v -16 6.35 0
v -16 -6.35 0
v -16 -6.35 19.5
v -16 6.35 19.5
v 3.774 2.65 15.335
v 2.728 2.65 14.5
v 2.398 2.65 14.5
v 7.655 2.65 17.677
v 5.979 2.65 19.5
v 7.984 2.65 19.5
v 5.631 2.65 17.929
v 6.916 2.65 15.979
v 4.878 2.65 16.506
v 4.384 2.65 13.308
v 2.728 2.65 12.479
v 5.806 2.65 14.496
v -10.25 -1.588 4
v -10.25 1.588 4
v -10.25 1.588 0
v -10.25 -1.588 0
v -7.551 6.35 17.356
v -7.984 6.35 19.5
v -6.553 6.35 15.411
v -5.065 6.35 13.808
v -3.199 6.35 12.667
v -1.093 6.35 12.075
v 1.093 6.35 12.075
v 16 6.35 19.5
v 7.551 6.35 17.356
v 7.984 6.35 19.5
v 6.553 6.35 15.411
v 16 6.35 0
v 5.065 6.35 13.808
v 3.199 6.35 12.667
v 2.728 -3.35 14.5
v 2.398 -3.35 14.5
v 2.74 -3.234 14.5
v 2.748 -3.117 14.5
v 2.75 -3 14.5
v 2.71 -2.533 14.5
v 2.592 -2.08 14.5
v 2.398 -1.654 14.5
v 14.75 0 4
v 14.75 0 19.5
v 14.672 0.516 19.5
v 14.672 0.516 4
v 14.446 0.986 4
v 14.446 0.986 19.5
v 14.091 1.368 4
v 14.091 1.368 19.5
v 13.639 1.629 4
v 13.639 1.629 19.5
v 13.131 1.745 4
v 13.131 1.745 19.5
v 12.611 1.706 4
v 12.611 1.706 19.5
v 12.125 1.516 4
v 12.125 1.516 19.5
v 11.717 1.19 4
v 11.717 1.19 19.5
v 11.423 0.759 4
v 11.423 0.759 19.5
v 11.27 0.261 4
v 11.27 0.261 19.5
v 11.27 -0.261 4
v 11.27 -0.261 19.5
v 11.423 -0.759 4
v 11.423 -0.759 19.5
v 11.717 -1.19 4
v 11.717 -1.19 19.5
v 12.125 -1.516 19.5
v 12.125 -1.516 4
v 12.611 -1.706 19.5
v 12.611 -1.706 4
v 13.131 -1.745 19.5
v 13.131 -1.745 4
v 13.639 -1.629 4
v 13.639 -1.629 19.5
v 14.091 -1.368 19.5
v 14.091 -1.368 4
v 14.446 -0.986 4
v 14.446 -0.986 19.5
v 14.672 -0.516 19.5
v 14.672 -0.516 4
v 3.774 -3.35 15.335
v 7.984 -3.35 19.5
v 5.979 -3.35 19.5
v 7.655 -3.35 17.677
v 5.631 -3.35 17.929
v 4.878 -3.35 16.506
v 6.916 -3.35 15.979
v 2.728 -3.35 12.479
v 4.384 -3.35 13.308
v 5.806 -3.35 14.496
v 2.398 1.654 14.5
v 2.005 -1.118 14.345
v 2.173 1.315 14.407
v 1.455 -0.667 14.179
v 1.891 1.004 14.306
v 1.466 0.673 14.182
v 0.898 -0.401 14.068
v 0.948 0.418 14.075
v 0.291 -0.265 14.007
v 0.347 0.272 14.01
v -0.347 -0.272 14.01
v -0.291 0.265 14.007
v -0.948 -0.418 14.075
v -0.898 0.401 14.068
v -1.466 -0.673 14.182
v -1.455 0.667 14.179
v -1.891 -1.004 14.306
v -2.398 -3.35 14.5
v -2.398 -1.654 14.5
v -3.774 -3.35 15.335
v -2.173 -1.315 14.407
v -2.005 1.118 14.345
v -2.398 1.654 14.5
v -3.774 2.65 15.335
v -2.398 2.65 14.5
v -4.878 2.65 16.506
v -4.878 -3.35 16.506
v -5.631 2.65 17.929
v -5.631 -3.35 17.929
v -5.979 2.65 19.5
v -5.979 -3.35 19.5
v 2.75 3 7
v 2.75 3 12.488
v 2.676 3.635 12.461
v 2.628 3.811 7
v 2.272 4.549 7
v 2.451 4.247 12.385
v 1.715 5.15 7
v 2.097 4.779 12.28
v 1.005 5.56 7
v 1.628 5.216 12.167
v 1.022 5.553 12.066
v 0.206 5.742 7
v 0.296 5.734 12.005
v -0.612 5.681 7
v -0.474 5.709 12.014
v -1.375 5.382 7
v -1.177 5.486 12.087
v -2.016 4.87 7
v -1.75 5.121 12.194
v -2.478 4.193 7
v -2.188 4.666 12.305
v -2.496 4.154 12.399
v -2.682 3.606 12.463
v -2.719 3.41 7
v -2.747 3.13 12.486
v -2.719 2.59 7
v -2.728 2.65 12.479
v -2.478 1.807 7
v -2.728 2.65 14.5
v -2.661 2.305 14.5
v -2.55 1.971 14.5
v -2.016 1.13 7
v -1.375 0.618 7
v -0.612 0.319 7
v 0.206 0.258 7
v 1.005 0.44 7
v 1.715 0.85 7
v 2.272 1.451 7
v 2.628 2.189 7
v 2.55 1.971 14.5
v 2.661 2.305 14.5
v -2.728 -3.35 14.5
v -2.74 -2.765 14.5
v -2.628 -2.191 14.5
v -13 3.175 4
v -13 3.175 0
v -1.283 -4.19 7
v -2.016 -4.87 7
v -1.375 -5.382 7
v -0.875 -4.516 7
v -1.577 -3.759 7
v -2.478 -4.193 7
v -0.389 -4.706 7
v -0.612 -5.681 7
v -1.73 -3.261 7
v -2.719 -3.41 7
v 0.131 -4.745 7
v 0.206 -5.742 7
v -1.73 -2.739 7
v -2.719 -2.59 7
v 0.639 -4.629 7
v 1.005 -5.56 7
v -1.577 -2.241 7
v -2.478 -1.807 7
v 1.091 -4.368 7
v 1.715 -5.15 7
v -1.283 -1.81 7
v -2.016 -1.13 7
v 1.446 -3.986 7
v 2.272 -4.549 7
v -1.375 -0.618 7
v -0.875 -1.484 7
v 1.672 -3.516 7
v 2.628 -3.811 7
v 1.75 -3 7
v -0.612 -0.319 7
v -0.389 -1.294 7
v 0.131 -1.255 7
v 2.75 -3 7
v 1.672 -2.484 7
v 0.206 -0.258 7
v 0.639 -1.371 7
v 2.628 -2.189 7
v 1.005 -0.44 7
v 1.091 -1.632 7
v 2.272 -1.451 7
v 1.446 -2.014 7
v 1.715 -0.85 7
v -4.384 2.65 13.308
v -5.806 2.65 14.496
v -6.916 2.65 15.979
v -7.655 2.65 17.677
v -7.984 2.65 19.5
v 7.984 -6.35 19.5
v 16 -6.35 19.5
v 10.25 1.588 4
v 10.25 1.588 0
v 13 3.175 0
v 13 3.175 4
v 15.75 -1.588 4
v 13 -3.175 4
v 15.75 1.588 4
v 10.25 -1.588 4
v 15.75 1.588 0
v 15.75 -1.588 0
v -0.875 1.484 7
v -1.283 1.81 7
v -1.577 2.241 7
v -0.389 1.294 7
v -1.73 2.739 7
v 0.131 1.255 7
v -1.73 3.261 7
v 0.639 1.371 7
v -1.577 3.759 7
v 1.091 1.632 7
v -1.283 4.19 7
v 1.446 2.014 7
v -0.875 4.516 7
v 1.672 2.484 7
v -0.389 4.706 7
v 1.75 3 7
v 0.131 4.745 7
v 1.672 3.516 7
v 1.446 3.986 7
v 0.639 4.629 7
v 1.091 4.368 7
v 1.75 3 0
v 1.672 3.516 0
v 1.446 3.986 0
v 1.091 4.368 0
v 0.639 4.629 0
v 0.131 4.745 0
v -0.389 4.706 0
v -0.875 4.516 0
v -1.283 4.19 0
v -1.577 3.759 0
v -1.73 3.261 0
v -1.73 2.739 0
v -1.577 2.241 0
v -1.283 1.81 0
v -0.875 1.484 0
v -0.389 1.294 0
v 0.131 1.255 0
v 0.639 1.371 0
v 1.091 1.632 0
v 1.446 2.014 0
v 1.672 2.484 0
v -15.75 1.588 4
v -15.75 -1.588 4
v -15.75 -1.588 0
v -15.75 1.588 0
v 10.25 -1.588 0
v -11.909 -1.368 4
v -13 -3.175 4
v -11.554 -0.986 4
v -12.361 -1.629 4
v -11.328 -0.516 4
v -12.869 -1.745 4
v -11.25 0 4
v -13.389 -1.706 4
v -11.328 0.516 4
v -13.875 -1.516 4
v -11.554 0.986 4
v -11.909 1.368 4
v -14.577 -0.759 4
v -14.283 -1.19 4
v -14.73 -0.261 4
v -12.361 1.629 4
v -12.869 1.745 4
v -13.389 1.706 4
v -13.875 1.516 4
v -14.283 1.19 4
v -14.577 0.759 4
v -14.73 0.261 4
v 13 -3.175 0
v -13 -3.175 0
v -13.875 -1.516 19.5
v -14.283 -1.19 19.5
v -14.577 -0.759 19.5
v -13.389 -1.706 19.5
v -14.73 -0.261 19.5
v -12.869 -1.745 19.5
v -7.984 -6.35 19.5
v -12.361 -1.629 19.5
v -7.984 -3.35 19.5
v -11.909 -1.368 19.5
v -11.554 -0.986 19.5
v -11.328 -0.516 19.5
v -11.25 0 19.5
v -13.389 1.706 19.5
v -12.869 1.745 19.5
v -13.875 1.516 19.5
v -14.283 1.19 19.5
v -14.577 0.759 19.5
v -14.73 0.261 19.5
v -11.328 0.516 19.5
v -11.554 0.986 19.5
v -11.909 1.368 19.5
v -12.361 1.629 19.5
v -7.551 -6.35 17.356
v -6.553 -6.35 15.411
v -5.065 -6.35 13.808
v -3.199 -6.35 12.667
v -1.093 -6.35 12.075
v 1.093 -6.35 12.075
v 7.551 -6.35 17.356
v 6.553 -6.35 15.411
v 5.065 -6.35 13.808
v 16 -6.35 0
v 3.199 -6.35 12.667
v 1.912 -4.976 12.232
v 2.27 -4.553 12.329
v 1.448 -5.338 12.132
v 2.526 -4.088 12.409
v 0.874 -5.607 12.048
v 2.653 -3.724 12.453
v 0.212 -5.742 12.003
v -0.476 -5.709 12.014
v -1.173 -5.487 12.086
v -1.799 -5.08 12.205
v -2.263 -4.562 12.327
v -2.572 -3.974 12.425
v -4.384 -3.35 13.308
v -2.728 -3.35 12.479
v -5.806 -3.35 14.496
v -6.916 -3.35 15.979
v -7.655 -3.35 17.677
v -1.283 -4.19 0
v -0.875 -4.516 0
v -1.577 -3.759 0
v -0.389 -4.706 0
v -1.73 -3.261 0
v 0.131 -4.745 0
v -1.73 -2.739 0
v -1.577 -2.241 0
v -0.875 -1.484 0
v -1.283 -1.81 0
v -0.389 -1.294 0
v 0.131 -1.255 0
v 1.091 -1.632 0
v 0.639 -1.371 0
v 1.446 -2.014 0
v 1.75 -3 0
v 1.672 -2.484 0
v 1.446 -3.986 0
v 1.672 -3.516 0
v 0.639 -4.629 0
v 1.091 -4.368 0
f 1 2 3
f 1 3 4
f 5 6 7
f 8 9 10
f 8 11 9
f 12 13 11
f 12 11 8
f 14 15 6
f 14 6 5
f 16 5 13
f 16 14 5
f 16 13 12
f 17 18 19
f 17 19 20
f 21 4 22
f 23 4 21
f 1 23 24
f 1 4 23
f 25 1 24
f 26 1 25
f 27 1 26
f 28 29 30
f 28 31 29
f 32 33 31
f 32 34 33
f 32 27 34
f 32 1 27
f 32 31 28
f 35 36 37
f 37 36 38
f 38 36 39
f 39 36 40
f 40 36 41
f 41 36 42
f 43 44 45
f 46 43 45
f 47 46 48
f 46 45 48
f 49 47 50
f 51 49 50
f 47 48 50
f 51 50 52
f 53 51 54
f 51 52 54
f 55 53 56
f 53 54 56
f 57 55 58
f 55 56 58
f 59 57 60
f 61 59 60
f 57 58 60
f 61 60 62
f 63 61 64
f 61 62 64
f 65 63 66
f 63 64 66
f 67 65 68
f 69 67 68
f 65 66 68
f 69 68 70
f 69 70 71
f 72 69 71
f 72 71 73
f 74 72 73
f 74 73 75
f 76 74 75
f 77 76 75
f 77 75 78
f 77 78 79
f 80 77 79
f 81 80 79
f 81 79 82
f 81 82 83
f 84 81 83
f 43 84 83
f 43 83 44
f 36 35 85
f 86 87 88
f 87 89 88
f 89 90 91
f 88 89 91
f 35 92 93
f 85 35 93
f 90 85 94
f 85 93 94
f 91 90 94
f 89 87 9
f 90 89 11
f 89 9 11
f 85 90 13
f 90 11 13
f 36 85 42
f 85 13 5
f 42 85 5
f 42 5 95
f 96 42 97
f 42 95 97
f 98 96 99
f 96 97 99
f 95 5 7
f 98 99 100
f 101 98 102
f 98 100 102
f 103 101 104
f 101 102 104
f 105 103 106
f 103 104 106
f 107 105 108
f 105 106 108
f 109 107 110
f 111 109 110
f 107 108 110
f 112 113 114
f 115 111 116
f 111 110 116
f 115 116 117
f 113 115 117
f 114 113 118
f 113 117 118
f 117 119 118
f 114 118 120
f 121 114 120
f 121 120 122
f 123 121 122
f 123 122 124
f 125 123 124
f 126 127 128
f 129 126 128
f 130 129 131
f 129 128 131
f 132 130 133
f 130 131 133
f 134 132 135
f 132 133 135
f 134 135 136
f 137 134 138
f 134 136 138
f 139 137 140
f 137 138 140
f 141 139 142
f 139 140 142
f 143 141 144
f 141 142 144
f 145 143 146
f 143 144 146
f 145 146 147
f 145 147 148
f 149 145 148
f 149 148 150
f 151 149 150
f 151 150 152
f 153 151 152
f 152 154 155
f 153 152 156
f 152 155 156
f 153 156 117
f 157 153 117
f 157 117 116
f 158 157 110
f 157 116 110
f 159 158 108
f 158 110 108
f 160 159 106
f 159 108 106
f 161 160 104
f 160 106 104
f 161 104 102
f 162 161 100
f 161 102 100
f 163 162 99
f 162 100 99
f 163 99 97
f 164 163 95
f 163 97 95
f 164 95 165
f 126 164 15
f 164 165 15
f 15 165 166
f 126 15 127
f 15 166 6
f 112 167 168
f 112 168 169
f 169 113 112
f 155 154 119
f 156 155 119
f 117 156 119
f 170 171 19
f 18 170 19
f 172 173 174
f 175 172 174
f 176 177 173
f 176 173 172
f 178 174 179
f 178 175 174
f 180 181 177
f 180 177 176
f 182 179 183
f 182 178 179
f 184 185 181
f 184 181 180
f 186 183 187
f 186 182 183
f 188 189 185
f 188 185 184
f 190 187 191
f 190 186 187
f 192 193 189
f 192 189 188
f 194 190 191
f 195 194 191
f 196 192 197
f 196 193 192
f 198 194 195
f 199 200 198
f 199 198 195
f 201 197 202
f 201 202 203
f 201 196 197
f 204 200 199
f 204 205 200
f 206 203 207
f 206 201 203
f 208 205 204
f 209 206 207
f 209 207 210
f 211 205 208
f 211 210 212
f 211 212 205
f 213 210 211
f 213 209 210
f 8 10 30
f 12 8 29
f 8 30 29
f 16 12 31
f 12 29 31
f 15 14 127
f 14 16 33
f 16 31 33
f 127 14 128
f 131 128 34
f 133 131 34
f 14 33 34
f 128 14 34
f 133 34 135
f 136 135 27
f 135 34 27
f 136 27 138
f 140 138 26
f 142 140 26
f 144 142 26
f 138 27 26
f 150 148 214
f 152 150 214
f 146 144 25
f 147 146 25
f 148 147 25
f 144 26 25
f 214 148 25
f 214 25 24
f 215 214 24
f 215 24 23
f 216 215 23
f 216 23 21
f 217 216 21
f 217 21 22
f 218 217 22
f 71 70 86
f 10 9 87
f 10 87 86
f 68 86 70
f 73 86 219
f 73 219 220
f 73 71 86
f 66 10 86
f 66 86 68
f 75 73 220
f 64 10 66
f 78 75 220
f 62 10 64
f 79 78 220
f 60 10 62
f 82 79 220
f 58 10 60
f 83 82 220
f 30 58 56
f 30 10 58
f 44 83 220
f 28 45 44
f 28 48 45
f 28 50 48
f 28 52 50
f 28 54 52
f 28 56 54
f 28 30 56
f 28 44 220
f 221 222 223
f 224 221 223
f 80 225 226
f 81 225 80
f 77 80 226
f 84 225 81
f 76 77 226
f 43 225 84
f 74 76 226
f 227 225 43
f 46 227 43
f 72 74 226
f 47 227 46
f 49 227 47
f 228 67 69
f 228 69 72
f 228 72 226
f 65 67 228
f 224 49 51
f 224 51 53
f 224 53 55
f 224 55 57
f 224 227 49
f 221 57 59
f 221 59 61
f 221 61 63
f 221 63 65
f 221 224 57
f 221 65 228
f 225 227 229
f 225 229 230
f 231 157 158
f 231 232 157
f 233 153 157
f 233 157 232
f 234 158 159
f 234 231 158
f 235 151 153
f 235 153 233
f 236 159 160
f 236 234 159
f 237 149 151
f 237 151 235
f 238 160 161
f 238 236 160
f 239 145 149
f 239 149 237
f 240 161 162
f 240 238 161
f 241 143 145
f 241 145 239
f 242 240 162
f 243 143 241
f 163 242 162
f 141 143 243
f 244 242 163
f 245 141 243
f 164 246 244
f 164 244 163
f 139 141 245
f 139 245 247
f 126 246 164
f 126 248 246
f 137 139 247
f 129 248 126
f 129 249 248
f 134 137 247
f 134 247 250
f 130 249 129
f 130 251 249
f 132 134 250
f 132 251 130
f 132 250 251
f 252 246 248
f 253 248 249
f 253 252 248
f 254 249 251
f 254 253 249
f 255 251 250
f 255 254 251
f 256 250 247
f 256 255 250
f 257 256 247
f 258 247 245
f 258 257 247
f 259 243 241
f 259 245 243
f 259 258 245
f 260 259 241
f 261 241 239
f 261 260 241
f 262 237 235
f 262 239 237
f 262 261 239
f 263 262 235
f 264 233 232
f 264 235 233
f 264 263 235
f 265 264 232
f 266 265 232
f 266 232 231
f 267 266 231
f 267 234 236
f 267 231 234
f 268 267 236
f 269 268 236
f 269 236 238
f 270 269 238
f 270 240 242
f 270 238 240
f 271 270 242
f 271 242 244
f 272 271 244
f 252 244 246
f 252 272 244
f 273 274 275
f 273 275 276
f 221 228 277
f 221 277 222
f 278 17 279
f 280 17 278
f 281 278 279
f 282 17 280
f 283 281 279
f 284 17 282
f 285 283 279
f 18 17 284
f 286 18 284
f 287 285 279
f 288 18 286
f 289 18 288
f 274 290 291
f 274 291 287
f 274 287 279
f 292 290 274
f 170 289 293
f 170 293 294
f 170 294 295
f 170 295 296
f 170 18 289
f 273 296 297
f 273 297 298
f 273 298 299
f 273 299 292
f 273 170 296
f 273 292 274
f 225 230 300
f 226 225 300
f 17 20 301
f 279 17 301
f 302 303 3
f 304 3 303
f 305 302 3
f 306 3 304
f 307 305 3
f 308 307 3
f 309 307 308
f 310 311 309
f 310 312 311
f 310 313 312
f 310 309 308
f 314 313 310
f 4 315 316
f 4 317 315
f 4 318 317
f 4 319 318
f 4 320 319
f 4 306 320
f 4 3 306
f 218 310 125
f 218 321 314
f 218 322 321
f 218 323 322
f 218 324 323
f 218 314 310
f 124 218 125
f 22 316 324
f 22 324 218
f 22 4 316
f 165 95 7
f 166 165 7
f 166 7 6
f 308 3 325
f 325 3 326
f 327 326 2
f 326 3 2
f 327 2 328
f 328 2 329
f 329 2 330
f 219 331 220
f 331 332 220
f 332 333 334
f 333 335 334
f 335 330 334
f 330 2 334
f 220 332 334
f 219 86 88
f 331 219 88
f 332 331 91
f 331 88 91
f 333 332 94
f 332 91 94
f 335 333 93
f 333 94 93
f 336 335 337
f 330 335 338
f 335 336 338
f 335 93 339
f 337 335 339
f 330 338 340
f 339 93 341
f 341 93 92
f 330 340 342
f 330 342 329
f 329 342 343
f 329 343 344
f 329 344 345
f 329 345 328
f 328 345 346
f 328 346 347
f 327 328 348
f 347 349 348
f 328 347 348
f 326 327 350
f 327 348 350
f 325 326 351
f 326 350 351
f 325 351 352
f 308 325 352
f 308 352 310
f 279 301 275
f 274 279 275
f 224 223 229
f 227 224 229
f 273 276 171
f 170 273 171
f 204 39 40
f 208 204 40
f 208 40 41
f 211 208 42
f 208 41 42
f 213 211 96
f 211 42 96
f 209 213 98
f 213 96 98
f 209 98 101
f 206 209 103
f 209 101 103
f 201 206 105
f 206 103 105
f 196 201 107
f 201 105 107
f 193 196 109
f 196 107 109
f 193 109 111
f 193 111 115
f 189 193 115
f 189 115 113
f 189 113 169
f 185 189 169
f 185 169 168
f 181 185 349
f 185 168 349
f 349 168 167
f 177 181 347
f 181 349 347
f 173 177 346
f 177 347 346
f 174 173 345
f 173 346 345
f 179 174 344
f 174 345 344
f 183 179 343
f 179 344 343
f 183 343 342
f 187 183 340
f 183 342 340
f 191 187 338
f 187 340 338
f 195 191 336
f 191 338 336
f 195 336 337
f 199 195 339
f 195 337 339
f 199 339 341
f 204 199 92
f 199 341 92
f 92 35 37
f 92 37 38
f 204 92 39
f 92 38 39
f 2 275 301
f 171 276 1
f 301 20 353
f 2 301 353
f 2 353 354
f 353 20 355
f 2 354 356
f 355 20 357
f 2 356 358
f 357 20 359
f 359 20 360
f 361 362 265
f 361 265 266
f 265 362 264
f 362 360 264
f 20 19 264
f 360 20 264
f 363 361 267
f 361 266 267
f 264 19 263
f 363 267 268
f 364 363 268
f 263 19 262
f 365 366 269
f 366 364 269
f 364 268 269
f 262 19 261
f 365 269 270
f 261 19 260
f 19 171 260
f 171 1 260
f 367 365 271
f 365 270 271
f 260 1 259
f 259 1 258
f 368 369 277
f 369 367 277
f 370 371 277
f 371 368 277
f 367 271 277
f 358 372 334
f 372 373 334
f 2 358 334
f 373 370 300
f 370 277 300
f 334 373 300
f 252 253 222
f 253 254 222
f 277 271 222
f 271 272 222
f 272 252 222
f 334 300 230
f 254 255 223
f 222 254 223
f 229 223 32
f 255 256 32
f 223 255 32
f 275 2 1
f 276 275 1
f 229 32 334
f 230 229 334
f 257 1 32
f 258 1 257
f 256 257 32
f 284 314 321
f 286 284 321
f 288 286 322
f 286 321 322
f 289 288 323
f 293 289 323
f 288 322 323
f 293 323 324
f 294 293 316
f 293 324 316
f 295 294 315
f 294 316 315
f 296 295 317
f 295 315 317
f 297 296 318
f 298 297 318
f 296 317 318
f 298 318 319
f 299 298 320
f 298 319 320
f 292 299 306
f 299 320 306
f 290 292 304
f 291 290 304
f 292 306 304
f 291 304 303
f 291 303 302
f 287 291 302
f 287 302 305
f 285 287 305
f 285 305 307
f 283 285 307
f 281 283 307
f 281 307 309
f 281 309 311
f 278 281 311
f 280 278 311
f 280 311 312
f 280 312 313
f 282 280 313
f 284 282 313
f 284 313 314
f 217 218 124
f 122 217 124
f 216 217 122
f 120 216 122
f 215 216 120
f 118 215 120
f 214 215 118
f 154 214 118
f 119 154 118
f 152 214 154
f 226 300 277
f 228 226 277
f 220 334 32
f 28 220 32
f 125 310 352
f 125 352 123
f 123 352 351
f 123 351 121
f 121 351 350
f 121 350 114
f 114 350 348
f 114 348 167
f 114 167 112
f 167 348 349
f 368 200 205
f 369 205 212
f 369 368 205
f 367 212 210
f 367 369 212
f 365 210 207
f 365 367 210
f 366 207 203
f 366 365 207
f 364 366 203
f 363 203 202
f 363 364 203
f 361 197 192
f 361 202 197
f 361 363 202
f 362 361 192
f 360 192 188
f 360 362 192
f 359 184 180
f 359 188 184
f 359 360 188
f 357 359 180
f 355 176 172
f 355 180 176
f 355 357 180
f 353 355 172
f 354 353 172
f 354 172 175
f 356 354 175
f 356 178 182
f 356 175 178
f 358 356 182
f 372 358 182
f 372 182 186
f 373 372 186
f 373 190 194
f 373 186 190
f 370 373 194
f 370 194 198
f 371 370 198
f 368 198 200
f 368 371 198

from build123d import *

# Parameters (mm, degrees)
SKETCH2_W           = 32
SKETCH2_H           = 12.7
SKETCH2_R           = 1.75
BOSS_EXTRUDE1_DEPTH = 19.5
SKETCH3_R           = 1.75
CUT_EXTRUDE1_DEPTH  = 20.5
CUT_EXTRUDE2_DEPTH  = 4
SKETCH5_R           = 8
CUT_EXTRUDE3_DEPTH  = 3.7
SKETCH9_R           = 6
CUT_EXTRUDE5_DEPTH  = 6
SKETCH10_R          = 8
CUT_EXTRUDE6_DEPTH  = 4
SKETCH6_R           = 2.75
CUT_EXTRUDE4_DEPTH  = 7.5


with BuildPart() as part:
    # Sketch2 → Boss-Extrude1 (new body)
    with BuildSketch(Plane.XY):
        Rectangle(SKETCH2_W, SKETCH2_H)
        with Locations((0, 3)):
            Circle(SKETCH2_R, mode=Mode.SUBTRACT)
        with Locations((0, -3)):
            Circle(SKETCH2_R, mode=Mode.SUBTRACT)
    extrude(amount=BOSS_EXTRUDE1_DEPTH)

    # Sketch3 → Cut-Extrude1 (cut, through all)
    with BuildSketch(Plane.XY.offset(19.5)):
        with Locations((-13, 0)):
            Circle(SKETCH3_R)
        with Locations((13, 0)):
            Circle(SKETCH3_R)
    extrude(amount=-CUT_EXTRUDE1_DEPTH, mode=Mode.SUBTRACT)

    # Sketch4 → Cut-Extrude2 (cut)
    with BuildSketch(Plane(origin=(0, 0, 0), x_dir=(-1, 0, 0), z_dir=(0, 0, -1))):
        Polygon((-10.25, -1.58771324), (-10.25, 1.58771324), (-13, 3.175426481), (-15.75, 1.58771324), (-15.75, -1.58771324), (-13, -3.175426481), align=None)
        Polygon((13, -3.175426481), (15.75, -1.58771324), (15.75, 1.58771324), (13, 3.175426481), (10.25, 1.58771324), (10.25, -1.58771324), align=None)
    extrude(amount=-CUT_EXTRUDE2_DEPTH, mode=Mode.SUBTRACT)

    # Sketch5 → Cut-Extrude3 (cut)
    with BuildSketch(Plane(origin=(0, 6.35, 0), x_dir=(1, 0, 0), z_dir=(0, 1, 0))):
        with Locations((0, -20)):
            Circle(SKETCH5_R)
    extrude(amount=-CUT_EXTRUDE3_DEPTH, mode=Mode.SUBTRACT)

    # Sketch9 → Cut-Extrude5 (cut)
    with BuildSketch(Plane(origin=(0, 2.65, 0), x_dir=(1, 0, 0), z_dir=(0, 1, 0))):
        with Locations((0, -20)):
            Circle(SKETCH9_R)
    extrude(amount=-CUT_EXTRUDE5_DEPTH, mode=Mode.SUBTRACT)

    # Sketch10 → Cut-Extrude6 (cut, through all)
    with BuildSketch(Plane(origin=(0, -3.35, 0), x_dir=(1, 0, 0), z_dir=(0, 1, 0))):
        with Locations((0, -20)):
            Circle(SKETCH10_R)
    extrude(amount=-CUT_EXTRUDE6_DEPTH, mode=Mode.SUBTRACT)

    # Sketch6 → Cut-Extrude4 (cut)
    with BuildSketch(Plane.XY.offset(14.5)):
        with Locations((0, 3)):
            Circle(SKETCH6_R)
        with Locations((0, -3)):
            Circle(SKETCH6_R)
    extrude(amount=-CUT_EXTRUDE4_DEPTH, mode=Mode.SUBTRACT)


solid = part.part
